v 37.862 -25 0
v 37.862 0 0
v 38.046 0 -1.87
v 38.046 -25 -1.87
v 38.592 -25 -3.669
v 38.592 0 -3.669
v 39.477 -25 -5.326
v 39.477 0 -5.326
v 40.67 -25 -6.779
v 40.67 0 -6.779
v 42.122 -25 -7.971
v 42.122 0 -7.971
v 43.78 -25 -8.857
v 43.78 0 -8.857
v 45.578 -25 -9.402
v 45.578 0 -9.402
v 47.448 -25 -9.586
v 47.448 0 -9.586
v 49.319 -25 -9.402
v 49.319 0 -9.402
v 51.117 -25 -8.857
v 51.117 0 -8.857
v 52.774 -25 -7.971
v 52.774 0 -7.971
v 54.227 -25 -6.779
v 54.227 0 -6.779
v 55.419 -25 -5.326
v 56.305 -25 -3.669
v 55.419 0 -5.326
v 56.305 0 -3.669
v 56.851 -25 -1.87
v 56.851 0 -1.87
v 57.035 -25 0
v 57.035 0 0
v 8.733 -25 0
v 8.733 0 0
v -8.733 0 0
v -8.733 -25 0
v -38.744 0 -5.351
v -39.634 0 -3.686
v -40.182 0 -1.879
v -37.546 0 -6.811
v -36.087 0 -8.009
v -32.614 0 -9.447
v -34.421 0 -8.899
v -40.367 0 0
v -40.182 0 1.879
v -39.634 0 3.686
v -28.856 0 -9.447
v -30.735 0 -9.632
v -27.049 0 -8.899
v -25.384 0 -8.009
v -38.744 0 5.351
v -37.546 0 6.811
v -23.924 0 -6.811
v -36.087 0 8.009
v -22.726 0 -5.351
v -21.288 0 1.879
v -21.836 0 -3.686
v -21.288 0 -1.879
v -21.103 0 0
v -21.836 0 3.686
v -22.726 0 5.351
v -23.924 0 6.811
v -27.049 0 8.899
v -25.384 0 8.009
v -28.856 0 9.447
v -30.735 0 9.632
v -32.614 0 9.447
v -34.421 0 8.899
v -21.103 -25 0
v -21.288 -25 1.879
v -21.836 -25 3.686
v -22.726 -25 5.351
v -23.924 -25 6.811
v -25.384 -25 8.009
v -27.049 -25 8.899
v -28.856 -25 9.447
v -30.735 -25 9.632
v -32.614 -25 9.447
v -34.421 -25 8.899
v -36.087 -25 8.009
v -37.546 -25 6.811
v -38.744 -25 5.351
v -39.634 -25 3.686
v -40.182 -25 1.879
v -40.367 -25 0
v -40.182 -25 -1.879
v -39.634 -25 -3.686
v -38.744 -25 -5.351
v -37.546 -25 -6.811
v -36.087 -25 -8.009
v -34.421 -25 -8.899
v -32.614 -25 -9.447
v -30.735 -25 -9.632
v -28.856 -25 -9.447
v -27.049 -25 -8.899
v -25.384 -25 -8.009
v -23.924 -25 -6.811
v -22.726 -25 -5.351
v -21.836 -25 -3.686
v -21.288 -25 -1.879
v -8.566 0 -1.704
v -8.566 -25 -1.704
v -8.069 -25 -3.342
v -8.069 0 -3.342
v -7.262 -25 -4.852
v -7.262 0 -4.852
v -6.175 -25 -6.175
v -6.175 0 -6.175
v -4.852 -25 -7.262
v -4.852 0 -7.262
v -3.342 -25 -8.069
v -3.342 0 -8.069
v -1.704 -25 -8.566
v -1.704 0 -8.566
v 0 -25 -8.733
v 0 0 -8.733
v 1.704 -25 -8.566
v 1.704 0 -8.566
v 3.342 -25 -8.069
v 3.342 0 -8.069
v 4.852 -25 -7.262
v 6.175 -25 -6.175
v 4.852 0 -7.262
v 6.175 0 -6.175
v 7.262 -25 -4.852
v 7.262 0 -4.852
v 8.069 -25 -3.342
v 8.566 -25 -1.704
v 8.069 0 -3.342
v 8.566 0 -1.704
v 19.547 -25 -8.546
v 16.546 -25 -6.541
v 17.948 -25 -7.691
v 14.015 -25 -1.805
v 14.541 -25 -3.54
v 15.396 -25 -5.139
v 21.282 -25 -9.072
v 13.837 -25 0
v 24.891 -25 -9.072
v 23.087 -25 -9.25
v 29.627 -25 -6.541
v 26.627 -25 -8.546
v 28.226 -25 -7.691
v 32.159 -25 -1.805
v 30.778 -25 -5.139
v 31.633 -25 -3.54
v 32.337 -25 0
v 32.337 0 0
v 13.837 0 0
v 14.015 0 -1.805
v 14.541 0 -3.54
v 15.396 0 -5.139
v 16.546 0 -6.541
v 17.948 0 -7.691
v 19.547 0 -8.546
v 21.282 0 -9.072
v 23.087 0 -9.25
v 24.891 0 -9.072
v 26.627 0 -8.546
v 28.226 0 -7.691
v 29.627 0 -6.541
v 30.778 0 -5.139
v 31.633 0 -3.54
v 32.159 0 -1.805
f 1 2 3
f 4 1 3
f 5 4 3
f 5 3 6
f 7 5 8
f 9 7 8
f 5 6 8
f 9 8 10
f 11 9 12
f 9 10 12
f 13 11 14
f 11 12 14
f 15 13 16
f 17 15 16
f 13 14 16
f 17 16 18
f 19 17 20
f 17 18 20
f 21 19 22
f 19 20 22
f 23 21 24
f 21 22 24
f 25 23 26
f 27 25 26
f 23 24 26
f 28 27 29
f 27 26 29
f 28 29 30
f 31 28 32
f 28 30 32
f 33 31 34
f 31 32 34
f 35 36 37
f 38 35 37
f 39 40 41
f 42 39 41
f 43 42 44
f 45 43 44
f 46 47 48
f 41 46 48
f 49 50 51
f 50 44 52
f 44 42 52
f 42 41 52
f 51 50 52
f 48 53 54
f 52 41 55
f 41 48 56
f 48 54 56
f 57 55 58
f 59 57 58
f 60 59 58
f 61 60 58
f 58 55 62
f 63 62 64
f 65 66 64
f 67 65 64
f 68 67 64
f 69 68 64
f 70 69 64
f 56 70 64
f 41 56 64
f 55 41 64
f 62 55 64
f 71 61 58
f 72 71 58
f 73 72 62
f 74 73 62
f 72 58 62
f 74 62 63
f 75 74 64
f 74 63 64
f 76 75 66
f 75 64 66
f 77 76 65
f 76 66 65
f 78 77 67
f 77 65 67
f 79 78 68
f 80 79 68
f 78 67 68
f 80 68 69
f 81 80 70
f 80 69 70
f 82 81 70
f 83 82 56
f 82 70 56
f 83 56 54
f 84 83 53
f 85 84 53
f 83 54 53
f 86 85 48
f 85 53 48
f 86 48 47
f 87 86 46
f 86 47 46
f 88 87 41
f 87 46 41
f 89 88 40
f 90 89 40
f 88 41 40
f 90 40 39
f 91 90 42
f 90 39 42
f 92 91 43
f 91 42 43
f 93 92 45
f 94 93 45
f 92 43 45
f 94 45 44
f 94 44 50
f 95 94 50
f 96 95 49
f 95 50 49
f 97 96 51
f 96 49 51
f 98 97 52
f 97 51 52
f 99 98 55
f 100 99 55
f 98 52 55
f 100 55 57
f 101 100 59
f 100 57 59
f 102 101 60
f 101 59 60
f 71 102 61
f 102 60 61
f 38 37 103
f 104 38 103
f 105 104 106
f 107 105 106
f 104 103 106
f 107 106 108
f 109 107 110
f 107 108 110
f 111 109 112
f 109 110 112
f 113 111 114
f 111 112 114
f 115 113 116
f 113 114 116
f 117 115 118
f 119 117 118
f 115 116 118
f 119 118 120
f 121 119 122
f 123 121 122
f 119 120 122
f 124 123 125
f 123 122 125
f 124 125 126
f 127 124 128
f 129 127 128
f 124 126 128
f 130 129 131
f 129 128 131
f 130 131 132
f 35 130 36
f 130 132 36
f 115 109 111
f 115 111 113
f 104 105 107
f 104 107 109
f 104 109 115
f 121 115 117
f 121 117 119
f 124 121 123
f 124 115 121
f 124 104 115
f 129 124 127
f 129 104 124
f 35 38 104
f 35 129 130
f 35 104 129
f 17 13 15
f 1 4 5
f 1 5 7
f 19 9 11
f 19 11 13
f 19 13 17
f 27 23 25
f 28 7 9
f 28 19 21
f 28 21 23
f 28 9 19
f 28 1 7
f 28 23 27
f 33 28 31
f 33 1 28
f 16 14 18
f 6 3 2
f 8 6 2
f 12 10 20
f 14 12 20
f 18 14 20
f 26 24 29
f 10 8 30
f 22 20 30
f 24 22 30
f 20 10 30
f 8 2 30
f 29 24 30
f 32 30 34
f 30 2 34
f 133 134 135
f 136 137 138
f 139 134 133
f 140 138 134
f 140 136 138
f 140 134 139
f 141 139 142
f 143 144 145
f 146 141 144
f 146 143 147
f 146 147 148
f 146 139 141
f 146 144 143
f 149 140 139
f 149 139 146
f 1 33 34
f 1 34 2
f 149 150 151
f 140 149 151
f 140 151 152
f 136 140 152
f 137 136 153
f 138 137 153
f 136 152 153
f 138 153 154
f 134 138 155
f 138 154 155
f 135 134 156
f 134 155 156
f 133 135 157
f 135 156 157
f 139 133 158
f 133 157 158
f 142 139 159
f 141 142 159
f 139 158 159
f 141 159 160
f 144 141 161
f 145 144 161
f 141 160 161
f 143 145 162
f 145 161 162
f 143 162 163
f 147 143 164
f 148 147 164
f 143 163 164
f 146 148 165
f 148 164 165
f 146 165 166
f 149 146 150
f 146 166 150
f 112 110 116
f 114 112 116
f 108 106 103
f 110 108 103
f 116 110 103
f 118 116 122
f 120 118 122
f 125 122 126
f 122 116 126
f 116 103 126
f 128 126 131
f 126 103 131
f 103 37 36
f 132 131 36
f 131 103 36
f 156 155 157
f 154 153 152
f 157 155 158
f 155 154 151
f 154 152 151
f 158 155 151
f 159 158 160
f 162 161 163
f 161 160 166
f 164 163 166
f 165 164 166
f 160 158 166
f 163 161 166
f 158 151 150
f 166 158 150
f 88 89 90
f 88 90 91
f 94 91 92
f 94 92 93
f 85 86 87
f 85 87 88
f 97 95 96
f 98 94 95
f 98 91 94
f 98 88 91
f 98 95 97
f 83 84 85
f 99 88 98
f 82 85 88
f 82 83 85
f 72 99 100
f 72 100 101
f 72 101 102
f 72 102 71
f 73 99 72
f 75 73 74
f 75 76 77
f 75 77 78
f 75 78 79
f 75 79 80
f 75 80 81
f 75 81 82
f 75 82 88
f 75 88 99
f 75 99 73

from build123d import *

# Parameters (mm, degrees)
F1_DEPTH = 25


with BuildPart() as f1:
    # F0 (on Front) → F1 (new body)
    with BuildSketch(Plane.XZ):
        with BuildLine():
            Line((47.4482923746, 0), (37.8618785329, 0))
            ThreePointArc((37.8618785329, 0), (47.4482923746, -9.5864138417), (57.0347062163, 0))
            Line((57.0347062163, 0), (47.4482923746, 0))
        make_face()
    extrude(amount=F1_DEPTH)


with BuildPart() as f1b:
    # F0 (on Front) → F1, piece 2 (new body)
    with BuildSketch(Plane.XZ):
        with BuildLine():
            ThreePointArc((-8.7333697495, 0), (0, -8.7333697495), (8.7333697495, 0))
            Line((8.7333697495, 0), (0, 0))
            Line((0, 0), (-8.7333697495, 0))
        make_face()
    extrude(amount=F1_DEPTH)


with BuildPart() as f1c:
    # F0 (on Front) → F1, piece 3 (new body)
    with BuildSketch(Plane.XZ):
        with BuildLine():
            ThreePointArc((-40.3674991654, 0), (-30.7351630181, -9.6323361473), (-21.1028268708, 0))
            Line((-21.1028268708, 0), (-30.7351630181, 0))
            Line((-30.7351630181, 0), (-40.3674991654, 0))
        make_face()
        with BuildLine():
            Line((-30.7351630181, 0), (-21.1028268708, 0))
            ThreePointArc((-21.1028268708, 0), (-30.7351630181, 9.6323361473), (-40.3674991654, 0))
            Line((-40.3674991654, 0), (-30.7351630181, 0))
        make_face()
    extrude(amount=F1_DEPTH)


with BuildPart() as f1d:
    # F0 (on Front) → F1, piece 4 (new body)
    with BuildSketch(Plane.XZ):
        with BuildLine():
            Line((23.0867806822, 0), (13.8369154357, 0))
            ThreePointArc((13.8369154357, 0), (23.0867806822, -9.2498652465), (32.3366459287, 0))
            Line((32.3366459287, 0), (23.0867806822, 0))
        make_face()
    extrude(amount=F1_DEPTH)


solid = Compound([f1.part, f1b.part, f1c.part, f1d.part])
